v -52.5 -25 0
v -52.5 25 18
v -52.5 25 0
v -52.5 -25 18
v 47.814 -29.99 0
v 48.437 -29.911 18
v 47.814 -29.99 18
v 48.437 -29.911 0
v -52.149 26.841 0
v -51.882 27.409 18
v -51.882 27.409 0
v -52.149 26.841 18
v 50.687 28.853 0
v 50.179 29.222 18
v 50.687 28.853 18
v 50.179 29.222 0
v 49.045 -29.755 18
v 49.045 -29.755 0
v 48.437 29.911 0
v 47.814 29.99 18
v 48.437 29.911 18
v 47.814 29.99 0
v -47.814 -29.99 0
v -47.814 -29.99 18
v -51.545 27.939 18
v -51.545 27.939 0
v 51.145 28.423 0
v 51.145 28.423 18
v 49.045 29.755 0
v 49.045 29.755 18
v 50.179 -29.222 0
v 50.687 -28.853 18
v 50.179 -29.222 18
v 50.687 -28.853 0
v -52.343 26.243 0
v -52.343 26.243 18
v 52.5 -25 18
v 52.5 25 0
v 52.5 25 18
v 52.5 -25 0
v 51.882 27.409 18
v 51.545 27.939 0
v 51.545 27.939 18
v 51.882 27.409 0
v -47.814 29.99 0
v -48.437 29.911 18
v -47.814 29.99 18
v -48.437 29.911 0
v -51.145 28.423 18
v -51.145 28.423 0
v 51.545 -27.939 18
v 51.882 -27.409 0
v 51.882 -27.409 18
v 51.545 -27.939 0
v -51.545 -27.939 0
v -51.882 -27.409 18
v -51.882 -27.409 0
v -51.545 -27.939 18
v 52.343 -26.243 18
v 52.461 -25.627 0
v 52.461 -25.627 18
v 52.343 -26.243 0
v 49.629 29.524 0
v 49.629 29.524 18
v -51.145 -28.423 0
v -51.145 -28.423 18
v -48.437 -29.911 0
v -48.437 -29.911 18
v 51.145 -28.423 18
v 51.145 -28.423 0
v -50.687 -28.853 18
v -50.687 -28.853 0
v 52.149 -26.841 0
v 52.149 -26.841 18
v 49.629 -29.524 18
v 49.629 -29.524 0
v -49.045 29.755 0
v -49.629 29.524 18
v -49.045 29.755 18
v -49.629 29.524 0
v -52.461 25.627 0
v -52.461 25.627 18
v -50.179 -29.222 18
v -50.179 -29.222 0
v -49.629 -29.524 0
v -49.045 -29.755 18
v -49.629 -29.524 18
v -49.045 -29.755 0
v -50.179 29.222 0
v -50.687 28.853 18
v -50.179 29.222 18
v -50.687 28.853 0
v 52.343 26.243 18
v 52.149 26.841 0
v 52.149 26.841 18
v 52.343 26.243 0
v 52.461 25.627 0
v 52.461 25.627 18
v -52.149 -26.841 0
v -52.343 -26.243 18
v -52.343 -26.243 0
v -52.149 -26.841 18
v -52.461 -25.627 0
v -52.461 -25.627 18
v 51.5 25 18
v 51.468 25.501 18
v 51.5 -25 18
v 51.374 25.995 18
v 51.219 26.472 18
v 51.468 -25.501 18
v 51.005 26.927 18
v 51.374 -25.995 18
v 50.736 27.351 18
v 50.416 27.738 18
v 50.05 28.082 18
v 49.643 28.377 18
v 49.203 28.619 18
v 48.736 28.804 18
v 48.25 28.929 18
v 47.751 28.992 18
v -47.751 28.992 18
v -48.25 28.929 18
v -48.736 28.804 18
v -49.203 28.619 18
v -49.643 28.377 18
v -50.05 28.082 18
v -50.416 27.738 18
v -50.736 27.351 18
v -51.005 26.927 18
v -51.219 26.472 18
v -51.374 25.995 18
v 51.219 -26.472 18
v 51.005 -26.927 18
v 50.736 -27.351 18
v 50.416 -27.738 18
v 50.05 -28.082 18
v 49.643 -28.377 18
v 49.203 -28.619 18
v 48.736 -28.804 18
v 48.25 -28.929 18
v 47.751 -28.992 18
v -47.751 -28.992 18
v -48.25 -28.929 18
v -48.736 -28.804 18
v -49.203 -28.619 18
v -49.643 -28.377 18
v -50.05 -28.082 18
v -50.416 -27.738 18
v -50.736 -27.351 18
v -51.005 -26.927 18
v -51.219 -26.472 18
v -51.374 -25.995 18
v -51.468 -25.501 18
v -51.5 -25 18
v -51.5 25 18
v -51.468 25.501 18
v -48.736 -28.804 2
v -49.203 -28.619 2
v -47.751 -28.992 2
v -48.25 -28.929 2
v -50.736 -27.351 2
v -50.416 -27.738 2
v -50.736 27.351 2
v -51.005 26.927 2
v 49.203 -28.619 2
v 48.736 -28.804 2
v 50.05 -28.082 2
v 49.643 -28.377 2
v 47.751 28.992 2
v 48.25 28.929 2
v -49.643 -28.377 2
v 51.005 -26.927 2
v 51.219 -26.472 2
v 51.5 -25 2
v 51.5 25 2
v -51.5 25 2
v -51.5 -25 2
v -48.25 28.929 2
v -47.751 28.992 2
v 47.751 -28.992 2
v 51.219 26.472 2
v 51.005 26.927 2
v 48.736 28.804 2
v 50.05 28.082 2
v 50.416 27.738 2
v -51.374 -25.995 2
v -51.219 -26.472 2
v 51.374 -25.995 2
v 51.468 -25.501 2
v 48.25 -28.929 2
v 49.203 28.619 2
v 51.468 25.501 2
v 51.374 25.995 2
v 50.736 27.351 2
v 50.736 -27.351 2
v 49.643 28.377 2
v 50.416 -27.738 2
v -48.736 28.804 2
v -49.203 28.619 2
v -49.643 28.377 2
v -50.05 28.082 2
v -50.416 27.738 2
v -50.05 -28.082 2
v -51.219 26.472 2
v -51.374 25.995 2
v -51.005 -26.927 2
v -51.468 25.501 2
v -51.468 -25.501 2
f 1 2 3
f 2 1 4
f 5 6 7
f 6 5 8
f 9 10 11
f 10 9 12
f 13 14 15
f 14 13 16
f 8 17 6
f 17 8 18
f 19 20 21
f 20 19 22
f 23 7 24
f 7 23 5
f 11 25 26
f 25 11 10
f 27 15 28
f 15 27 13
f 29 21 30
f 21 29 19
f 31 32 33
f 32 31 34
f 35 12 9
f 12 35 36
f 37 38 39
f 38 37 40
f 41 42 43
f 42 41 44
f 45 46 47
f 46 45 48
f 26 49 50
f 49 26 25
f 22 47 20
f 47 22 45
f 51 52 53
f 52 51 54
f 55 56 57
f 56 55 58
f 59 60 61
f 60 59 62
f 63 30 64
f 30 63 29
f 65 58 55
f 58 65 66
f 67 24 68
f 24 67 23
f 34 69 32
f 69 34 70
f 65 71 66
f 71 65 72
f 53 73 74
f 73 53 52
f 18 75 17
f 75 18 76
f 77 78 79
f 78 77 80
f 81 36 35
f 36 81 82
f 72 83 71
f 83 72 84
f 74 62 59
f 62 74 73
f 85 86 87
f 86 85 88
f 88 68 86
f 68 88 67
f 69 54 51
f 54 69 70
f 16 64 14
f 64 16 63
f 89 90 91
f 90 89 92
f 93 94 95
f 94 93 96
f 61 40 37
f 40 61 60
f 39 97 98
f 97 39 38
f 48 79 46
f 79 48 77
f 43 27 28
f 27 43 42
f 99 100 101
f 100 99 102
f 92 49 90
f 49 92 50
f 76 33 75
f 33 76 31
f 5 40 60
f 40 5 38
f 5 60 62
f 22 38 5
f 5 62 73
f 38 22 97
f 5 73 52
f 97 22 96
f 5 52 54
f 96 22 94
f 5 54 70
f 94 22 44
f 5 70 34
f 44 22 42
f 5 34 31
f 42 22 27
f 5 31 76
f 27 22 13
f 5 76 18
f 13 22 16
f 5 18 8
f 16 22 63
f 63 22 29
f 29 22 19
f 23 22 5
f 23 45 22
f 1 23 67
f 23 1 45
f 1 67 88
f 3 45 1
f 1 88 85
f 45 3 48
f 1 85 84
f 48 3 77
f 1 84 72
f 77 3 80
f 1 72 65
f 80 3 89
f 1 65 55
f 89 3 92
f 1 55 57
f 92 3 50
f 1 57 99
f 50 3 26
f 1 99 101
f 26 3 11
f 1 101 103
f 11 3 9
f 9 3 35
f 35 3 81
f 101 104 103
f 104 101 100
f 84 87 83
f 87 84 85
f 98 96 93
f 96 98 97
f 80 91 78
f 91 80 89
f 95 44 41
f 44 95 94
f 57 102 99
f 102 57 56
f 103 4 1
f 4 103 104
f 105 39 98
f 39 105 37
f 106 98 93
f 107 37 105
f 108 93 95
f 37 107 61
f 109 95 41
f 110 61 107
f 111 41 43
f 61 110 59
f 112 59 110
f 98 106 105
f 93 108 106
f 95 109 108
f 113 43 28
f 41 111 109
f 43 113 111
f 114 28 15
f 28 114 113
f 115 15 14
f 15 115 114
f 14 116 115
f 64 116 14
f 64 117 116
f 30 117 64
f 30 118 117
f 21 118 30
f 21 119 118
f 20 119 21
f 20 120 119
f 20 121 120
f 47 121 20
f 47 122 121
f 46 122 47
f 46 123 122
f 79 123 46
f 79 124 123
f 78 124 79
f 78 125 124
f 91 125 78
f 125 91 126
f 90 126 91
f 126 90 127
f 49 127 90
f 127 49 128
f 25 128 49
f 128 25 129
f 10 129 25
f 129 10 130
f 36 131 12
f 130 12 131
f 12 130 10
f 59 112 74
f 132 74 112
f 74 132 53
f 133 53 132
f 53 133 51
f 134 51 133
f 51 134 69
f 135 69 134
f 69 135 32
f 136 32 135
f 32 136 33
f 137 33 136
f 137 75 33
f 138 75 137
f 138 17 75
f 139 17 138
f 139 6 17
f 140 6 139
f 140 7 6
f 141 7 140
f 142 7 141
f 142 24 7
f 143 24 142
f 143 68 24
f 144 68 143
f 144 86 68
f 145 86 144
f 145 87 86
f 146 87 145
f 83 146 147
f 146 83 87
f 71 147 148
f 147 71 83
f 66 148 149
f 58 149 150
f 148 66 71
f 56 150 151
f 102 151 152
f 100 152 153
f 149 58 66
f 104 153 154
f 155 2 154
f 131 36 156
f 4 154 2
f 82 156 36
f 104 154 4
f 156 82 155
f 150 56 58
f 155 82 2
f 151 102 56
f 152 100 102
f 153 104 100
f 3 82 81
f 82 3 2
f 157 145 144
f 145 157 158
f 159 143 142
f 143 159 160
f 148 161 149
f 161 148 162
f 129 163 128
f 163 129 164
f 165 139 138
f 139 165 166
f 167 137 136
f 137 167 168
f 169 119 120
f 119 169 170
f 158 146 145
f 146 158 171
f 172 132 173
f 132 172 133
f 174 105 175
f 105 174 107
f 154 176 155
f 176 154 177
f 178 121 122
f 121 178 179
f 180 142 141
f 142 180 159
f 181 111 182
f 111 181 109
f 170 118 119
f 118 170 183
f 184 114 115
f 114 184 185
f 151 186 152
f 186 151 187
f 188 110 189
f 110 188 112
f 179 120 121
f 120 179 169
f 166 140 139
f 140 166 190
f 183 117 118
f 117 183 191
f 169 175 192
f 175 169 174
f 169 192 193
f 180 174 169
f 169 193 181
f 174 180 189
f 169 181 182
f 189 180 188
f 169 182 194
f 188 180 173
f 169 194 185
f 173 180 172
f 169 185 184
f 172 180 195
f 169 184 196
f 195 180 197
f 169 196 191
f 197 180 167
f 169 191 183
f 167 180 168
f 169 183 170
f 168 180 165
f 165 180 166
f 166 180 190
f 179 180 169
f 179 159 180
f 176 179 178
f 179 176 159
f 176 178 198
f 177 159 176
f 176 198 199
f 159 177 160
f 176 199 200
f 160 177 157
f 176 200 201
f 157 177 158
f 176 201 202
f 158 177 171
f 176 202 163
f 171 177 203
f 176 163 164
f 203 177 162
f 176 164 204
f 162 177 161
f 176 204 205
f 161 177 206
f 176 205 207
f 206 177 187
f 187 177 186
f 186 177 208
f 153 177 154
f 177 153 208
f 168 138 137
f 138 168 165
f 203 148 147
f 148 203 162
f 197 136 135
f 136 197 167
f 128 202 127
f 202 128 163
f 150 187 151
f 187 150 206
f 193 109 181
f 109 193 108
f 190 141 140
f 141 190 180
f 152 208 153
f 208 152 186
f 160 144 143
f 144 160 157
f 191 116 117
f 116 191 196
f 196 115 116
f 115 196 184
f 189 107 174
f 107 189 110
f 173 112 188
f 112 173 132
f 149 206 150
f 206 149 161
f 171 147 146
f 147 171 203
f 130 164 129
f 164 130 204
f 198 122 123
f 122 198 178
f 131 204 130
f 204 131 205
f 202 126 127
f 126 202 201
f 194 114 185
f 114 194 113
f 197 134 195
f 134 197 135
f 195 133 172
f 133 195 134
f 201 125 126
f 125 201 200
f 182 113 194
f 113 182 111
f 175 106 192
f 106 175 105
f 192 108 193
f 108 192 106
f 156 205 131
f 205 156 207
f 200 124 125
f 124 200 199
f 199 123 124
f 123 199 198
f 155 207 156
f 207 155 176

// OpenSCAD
$fn = 50;


difference() {
	union() {
		hull() {
			translate(v = [-47.5000000000, 25.0000000000, 0]) {
				cylinder(h = 18, r = 5);
			}
			translate(v = [47.5000000000, 25.0000000000, 0]) {
				cylinder(h = 18, r = 5);
			}
			translate(v = [-47.5000000000, -25.0000000000, 0]) {
				cylinder(h = 18, r = 5);
			}
			translate(v = [47.5000000000, -25.0000000000, 0]) {
				cylinder(h = 18, r = 5);
			}
		}
	}
	union() {
		translate(v = [0, 0, 2]) {
			hull() {
				translate(v = [-47.5000000000, 25.0000000000, 0]) {
					cylinder(h = 16, r = 4);
				}
				translate(v = [47.5000000000, 25.0000000000, 0]) {
					cylinder(h = 16, r = 4);
				}
				translate(v = [-47.5000000000, -25.0000000000, 0]) {
					cylinder(h = 16, r = 4);
				}
				translate(v = [47.5000000000, -25.0000000000, 0]) {
					cylinder(h = 16, r = 4);
				}
			}
		}
	}
}
